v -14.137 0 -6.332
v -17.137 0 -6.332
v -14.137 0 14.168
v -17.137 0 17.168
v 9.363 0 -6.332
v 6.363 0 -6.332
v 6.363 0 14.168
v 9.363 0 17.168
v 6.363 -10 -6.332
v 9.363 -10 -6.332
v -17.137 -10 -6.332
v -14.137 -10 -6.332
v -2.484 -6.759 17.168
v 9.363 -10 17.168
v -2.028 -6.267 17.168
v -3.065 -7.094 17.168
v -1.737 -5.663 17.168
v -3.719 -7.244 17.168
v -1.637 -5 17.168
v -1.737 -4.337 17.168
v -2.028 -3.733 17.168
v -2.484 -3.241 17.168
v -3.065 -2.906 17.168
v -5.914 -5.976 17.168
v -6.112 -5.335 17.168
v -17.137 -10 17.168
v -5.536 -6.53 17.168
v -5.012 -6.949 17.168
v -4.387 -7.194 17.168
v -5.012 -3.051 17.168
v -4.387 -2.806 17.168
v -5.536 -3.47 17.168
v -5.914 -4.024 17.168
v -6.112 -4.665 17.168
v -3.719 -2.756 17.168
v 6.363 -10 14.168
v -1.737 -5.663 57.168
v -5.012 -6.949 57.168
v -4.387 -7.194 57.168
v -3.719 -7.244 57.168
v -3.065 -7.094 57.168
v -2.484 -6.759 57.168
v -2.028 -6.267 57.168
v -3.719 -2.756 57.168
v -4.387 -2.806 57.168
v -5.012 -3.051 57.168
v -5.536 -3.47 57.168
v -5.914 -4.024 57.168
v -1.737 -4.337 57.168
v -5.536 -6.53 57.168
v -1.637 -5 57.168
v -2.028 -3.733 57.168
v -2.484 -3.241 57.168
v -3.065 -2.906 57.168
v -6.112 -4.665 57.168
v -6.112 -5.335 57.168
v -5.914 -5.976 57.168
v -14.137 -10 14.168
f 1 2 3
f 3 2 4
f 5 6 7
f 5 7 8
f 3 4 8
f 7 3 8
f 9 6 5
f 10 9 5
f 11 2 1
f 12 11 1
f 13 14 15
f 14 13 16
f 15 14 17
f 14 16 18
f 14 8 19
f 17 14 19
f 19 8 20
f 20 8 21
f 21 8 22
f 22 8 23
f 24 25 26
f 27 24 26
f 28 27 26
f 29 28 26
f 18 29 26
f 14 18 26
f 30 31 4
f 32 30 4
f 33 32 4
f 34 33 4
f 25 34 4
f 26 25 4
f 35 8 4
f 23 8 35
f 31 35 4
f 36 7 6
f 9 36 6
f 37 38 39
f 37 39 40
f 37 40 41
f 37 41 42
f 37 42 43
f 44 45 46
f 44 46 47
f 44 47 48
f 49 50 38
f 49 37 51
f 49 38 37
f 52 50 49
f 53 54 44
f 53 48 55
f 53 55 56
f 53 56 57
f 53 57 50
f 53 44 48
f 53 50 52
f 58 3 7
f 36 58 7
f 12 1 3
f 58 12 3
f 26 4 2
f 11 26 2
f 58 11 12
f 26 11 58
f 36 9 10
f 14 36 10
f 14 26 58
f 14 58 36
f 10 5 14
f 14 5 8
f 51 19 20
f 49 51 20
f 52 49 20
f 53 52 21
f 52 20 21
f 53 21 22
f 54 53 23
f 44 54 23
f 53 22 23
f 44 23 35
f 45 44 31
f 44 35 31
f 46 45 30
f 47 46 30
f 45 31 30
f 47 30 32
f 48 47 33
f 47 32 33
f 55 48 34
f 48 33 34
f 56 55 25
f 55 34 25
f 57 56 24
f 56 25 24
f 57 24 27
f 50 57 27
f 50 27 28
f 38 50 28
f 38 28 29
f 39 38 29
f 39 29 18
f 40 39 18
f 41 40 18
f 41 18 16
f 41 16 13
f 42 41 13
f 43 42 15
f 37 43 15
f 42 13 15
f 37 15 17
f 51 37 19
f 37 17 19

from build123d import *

# Parameters (mm, degrees)
F0_W     = 20.5
F0_H     = 3
F1_DEPTH = 10
F2_R     = 2.25
F3_DEPTH = 40


with BuildPart() as f1:
    # F0 (on Front) → F1 (new body)
    with BuildSketch(Plane.XZ):
        Polygon((-17.136792, -6.331904), (-14.136792, -6.331904), (-14.136792, 14.168096), (-14.136792, 17.168096), (-17.136792, 17.168096), align=None)
        with Locations((-3.886792, 15.668096)):
            Rectangle(F0_W, F0_H)
        Polygon((6.363208, 14.168096), (6.363208, -6.331904), (9.363208, -6.331904), (9.363208, 17.168096), (6.363208, 17.168096), align=None)
    extrude(amount=F1_DEPTH)

    # F2 (on face) → F3 (join)
    with BuildSketch(Plane.XY.offset(17.168096)):
        with Locations((-3.886792, -5)):
            Circle(F2_R)
    extrude(amount=F3_DEPTH)


solid = f1.part
